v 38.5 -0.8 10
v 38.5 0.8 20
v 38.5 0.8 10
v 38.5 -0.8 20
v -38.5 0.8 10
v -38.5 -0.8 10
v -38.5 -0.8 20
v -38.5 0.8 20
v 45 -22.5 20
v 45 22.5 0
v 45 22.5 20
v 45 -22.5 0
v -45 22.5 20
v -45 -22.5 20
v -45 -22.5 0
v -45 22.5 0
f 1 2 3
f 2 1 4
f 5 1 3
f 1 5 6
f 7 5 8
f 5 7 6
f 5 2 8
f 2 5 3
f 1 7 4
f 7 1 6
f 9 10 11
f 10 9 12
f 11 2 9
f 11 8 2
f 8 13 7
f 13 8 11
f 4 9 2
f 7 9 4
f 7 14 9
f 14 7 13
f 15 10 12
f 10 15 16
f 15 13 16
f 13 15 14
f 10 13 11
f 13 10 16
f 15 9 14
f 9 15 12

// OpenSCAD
// Microscope slide drying rack
// Print orientation: base block on the bed (z = 0), slots open upward.

// ---------------- Parameters ----------------
block_len    = 90;   // base block length along X (mm)
block_wid    = 45;   // base block width along Y (mm)
block_h      = 20;   // base block height along Z (mm)

slot_count   = 10;   // number of microscope slide slots
slot_len     = 77;   // slot length along X (mm)
slot_w       = 1.6;  // slot width along Y (mm)
slot_depth   = 10;   // slot depth into block from top face (mm)
slot_pitch   = 3.5;  // centre-to-centre slot spacing along Y (mm)

eps          = 0.5;  // overshoot of cutters past faces (mm)

$fn = 64;

// ---------------- Model ----------------
difference() {
    // Base block, centred in X and Y, sitting on z = 0
    translate([-block_len/2, -block_wid/2, 0])
        cube([block_len, block_wid, block_h]);

    // Slots: along X, centred group in X and Y
    for (i = [0 : slot_count - 1]) {
        y = (i - (slot_count - 1)/2) * slot_pitch;
        translate([-slot_len/2, -slot_w/2, block_h - slot_depth])
            cube([slot_len, slot_w, slot_depth + eps]);
    }
}
